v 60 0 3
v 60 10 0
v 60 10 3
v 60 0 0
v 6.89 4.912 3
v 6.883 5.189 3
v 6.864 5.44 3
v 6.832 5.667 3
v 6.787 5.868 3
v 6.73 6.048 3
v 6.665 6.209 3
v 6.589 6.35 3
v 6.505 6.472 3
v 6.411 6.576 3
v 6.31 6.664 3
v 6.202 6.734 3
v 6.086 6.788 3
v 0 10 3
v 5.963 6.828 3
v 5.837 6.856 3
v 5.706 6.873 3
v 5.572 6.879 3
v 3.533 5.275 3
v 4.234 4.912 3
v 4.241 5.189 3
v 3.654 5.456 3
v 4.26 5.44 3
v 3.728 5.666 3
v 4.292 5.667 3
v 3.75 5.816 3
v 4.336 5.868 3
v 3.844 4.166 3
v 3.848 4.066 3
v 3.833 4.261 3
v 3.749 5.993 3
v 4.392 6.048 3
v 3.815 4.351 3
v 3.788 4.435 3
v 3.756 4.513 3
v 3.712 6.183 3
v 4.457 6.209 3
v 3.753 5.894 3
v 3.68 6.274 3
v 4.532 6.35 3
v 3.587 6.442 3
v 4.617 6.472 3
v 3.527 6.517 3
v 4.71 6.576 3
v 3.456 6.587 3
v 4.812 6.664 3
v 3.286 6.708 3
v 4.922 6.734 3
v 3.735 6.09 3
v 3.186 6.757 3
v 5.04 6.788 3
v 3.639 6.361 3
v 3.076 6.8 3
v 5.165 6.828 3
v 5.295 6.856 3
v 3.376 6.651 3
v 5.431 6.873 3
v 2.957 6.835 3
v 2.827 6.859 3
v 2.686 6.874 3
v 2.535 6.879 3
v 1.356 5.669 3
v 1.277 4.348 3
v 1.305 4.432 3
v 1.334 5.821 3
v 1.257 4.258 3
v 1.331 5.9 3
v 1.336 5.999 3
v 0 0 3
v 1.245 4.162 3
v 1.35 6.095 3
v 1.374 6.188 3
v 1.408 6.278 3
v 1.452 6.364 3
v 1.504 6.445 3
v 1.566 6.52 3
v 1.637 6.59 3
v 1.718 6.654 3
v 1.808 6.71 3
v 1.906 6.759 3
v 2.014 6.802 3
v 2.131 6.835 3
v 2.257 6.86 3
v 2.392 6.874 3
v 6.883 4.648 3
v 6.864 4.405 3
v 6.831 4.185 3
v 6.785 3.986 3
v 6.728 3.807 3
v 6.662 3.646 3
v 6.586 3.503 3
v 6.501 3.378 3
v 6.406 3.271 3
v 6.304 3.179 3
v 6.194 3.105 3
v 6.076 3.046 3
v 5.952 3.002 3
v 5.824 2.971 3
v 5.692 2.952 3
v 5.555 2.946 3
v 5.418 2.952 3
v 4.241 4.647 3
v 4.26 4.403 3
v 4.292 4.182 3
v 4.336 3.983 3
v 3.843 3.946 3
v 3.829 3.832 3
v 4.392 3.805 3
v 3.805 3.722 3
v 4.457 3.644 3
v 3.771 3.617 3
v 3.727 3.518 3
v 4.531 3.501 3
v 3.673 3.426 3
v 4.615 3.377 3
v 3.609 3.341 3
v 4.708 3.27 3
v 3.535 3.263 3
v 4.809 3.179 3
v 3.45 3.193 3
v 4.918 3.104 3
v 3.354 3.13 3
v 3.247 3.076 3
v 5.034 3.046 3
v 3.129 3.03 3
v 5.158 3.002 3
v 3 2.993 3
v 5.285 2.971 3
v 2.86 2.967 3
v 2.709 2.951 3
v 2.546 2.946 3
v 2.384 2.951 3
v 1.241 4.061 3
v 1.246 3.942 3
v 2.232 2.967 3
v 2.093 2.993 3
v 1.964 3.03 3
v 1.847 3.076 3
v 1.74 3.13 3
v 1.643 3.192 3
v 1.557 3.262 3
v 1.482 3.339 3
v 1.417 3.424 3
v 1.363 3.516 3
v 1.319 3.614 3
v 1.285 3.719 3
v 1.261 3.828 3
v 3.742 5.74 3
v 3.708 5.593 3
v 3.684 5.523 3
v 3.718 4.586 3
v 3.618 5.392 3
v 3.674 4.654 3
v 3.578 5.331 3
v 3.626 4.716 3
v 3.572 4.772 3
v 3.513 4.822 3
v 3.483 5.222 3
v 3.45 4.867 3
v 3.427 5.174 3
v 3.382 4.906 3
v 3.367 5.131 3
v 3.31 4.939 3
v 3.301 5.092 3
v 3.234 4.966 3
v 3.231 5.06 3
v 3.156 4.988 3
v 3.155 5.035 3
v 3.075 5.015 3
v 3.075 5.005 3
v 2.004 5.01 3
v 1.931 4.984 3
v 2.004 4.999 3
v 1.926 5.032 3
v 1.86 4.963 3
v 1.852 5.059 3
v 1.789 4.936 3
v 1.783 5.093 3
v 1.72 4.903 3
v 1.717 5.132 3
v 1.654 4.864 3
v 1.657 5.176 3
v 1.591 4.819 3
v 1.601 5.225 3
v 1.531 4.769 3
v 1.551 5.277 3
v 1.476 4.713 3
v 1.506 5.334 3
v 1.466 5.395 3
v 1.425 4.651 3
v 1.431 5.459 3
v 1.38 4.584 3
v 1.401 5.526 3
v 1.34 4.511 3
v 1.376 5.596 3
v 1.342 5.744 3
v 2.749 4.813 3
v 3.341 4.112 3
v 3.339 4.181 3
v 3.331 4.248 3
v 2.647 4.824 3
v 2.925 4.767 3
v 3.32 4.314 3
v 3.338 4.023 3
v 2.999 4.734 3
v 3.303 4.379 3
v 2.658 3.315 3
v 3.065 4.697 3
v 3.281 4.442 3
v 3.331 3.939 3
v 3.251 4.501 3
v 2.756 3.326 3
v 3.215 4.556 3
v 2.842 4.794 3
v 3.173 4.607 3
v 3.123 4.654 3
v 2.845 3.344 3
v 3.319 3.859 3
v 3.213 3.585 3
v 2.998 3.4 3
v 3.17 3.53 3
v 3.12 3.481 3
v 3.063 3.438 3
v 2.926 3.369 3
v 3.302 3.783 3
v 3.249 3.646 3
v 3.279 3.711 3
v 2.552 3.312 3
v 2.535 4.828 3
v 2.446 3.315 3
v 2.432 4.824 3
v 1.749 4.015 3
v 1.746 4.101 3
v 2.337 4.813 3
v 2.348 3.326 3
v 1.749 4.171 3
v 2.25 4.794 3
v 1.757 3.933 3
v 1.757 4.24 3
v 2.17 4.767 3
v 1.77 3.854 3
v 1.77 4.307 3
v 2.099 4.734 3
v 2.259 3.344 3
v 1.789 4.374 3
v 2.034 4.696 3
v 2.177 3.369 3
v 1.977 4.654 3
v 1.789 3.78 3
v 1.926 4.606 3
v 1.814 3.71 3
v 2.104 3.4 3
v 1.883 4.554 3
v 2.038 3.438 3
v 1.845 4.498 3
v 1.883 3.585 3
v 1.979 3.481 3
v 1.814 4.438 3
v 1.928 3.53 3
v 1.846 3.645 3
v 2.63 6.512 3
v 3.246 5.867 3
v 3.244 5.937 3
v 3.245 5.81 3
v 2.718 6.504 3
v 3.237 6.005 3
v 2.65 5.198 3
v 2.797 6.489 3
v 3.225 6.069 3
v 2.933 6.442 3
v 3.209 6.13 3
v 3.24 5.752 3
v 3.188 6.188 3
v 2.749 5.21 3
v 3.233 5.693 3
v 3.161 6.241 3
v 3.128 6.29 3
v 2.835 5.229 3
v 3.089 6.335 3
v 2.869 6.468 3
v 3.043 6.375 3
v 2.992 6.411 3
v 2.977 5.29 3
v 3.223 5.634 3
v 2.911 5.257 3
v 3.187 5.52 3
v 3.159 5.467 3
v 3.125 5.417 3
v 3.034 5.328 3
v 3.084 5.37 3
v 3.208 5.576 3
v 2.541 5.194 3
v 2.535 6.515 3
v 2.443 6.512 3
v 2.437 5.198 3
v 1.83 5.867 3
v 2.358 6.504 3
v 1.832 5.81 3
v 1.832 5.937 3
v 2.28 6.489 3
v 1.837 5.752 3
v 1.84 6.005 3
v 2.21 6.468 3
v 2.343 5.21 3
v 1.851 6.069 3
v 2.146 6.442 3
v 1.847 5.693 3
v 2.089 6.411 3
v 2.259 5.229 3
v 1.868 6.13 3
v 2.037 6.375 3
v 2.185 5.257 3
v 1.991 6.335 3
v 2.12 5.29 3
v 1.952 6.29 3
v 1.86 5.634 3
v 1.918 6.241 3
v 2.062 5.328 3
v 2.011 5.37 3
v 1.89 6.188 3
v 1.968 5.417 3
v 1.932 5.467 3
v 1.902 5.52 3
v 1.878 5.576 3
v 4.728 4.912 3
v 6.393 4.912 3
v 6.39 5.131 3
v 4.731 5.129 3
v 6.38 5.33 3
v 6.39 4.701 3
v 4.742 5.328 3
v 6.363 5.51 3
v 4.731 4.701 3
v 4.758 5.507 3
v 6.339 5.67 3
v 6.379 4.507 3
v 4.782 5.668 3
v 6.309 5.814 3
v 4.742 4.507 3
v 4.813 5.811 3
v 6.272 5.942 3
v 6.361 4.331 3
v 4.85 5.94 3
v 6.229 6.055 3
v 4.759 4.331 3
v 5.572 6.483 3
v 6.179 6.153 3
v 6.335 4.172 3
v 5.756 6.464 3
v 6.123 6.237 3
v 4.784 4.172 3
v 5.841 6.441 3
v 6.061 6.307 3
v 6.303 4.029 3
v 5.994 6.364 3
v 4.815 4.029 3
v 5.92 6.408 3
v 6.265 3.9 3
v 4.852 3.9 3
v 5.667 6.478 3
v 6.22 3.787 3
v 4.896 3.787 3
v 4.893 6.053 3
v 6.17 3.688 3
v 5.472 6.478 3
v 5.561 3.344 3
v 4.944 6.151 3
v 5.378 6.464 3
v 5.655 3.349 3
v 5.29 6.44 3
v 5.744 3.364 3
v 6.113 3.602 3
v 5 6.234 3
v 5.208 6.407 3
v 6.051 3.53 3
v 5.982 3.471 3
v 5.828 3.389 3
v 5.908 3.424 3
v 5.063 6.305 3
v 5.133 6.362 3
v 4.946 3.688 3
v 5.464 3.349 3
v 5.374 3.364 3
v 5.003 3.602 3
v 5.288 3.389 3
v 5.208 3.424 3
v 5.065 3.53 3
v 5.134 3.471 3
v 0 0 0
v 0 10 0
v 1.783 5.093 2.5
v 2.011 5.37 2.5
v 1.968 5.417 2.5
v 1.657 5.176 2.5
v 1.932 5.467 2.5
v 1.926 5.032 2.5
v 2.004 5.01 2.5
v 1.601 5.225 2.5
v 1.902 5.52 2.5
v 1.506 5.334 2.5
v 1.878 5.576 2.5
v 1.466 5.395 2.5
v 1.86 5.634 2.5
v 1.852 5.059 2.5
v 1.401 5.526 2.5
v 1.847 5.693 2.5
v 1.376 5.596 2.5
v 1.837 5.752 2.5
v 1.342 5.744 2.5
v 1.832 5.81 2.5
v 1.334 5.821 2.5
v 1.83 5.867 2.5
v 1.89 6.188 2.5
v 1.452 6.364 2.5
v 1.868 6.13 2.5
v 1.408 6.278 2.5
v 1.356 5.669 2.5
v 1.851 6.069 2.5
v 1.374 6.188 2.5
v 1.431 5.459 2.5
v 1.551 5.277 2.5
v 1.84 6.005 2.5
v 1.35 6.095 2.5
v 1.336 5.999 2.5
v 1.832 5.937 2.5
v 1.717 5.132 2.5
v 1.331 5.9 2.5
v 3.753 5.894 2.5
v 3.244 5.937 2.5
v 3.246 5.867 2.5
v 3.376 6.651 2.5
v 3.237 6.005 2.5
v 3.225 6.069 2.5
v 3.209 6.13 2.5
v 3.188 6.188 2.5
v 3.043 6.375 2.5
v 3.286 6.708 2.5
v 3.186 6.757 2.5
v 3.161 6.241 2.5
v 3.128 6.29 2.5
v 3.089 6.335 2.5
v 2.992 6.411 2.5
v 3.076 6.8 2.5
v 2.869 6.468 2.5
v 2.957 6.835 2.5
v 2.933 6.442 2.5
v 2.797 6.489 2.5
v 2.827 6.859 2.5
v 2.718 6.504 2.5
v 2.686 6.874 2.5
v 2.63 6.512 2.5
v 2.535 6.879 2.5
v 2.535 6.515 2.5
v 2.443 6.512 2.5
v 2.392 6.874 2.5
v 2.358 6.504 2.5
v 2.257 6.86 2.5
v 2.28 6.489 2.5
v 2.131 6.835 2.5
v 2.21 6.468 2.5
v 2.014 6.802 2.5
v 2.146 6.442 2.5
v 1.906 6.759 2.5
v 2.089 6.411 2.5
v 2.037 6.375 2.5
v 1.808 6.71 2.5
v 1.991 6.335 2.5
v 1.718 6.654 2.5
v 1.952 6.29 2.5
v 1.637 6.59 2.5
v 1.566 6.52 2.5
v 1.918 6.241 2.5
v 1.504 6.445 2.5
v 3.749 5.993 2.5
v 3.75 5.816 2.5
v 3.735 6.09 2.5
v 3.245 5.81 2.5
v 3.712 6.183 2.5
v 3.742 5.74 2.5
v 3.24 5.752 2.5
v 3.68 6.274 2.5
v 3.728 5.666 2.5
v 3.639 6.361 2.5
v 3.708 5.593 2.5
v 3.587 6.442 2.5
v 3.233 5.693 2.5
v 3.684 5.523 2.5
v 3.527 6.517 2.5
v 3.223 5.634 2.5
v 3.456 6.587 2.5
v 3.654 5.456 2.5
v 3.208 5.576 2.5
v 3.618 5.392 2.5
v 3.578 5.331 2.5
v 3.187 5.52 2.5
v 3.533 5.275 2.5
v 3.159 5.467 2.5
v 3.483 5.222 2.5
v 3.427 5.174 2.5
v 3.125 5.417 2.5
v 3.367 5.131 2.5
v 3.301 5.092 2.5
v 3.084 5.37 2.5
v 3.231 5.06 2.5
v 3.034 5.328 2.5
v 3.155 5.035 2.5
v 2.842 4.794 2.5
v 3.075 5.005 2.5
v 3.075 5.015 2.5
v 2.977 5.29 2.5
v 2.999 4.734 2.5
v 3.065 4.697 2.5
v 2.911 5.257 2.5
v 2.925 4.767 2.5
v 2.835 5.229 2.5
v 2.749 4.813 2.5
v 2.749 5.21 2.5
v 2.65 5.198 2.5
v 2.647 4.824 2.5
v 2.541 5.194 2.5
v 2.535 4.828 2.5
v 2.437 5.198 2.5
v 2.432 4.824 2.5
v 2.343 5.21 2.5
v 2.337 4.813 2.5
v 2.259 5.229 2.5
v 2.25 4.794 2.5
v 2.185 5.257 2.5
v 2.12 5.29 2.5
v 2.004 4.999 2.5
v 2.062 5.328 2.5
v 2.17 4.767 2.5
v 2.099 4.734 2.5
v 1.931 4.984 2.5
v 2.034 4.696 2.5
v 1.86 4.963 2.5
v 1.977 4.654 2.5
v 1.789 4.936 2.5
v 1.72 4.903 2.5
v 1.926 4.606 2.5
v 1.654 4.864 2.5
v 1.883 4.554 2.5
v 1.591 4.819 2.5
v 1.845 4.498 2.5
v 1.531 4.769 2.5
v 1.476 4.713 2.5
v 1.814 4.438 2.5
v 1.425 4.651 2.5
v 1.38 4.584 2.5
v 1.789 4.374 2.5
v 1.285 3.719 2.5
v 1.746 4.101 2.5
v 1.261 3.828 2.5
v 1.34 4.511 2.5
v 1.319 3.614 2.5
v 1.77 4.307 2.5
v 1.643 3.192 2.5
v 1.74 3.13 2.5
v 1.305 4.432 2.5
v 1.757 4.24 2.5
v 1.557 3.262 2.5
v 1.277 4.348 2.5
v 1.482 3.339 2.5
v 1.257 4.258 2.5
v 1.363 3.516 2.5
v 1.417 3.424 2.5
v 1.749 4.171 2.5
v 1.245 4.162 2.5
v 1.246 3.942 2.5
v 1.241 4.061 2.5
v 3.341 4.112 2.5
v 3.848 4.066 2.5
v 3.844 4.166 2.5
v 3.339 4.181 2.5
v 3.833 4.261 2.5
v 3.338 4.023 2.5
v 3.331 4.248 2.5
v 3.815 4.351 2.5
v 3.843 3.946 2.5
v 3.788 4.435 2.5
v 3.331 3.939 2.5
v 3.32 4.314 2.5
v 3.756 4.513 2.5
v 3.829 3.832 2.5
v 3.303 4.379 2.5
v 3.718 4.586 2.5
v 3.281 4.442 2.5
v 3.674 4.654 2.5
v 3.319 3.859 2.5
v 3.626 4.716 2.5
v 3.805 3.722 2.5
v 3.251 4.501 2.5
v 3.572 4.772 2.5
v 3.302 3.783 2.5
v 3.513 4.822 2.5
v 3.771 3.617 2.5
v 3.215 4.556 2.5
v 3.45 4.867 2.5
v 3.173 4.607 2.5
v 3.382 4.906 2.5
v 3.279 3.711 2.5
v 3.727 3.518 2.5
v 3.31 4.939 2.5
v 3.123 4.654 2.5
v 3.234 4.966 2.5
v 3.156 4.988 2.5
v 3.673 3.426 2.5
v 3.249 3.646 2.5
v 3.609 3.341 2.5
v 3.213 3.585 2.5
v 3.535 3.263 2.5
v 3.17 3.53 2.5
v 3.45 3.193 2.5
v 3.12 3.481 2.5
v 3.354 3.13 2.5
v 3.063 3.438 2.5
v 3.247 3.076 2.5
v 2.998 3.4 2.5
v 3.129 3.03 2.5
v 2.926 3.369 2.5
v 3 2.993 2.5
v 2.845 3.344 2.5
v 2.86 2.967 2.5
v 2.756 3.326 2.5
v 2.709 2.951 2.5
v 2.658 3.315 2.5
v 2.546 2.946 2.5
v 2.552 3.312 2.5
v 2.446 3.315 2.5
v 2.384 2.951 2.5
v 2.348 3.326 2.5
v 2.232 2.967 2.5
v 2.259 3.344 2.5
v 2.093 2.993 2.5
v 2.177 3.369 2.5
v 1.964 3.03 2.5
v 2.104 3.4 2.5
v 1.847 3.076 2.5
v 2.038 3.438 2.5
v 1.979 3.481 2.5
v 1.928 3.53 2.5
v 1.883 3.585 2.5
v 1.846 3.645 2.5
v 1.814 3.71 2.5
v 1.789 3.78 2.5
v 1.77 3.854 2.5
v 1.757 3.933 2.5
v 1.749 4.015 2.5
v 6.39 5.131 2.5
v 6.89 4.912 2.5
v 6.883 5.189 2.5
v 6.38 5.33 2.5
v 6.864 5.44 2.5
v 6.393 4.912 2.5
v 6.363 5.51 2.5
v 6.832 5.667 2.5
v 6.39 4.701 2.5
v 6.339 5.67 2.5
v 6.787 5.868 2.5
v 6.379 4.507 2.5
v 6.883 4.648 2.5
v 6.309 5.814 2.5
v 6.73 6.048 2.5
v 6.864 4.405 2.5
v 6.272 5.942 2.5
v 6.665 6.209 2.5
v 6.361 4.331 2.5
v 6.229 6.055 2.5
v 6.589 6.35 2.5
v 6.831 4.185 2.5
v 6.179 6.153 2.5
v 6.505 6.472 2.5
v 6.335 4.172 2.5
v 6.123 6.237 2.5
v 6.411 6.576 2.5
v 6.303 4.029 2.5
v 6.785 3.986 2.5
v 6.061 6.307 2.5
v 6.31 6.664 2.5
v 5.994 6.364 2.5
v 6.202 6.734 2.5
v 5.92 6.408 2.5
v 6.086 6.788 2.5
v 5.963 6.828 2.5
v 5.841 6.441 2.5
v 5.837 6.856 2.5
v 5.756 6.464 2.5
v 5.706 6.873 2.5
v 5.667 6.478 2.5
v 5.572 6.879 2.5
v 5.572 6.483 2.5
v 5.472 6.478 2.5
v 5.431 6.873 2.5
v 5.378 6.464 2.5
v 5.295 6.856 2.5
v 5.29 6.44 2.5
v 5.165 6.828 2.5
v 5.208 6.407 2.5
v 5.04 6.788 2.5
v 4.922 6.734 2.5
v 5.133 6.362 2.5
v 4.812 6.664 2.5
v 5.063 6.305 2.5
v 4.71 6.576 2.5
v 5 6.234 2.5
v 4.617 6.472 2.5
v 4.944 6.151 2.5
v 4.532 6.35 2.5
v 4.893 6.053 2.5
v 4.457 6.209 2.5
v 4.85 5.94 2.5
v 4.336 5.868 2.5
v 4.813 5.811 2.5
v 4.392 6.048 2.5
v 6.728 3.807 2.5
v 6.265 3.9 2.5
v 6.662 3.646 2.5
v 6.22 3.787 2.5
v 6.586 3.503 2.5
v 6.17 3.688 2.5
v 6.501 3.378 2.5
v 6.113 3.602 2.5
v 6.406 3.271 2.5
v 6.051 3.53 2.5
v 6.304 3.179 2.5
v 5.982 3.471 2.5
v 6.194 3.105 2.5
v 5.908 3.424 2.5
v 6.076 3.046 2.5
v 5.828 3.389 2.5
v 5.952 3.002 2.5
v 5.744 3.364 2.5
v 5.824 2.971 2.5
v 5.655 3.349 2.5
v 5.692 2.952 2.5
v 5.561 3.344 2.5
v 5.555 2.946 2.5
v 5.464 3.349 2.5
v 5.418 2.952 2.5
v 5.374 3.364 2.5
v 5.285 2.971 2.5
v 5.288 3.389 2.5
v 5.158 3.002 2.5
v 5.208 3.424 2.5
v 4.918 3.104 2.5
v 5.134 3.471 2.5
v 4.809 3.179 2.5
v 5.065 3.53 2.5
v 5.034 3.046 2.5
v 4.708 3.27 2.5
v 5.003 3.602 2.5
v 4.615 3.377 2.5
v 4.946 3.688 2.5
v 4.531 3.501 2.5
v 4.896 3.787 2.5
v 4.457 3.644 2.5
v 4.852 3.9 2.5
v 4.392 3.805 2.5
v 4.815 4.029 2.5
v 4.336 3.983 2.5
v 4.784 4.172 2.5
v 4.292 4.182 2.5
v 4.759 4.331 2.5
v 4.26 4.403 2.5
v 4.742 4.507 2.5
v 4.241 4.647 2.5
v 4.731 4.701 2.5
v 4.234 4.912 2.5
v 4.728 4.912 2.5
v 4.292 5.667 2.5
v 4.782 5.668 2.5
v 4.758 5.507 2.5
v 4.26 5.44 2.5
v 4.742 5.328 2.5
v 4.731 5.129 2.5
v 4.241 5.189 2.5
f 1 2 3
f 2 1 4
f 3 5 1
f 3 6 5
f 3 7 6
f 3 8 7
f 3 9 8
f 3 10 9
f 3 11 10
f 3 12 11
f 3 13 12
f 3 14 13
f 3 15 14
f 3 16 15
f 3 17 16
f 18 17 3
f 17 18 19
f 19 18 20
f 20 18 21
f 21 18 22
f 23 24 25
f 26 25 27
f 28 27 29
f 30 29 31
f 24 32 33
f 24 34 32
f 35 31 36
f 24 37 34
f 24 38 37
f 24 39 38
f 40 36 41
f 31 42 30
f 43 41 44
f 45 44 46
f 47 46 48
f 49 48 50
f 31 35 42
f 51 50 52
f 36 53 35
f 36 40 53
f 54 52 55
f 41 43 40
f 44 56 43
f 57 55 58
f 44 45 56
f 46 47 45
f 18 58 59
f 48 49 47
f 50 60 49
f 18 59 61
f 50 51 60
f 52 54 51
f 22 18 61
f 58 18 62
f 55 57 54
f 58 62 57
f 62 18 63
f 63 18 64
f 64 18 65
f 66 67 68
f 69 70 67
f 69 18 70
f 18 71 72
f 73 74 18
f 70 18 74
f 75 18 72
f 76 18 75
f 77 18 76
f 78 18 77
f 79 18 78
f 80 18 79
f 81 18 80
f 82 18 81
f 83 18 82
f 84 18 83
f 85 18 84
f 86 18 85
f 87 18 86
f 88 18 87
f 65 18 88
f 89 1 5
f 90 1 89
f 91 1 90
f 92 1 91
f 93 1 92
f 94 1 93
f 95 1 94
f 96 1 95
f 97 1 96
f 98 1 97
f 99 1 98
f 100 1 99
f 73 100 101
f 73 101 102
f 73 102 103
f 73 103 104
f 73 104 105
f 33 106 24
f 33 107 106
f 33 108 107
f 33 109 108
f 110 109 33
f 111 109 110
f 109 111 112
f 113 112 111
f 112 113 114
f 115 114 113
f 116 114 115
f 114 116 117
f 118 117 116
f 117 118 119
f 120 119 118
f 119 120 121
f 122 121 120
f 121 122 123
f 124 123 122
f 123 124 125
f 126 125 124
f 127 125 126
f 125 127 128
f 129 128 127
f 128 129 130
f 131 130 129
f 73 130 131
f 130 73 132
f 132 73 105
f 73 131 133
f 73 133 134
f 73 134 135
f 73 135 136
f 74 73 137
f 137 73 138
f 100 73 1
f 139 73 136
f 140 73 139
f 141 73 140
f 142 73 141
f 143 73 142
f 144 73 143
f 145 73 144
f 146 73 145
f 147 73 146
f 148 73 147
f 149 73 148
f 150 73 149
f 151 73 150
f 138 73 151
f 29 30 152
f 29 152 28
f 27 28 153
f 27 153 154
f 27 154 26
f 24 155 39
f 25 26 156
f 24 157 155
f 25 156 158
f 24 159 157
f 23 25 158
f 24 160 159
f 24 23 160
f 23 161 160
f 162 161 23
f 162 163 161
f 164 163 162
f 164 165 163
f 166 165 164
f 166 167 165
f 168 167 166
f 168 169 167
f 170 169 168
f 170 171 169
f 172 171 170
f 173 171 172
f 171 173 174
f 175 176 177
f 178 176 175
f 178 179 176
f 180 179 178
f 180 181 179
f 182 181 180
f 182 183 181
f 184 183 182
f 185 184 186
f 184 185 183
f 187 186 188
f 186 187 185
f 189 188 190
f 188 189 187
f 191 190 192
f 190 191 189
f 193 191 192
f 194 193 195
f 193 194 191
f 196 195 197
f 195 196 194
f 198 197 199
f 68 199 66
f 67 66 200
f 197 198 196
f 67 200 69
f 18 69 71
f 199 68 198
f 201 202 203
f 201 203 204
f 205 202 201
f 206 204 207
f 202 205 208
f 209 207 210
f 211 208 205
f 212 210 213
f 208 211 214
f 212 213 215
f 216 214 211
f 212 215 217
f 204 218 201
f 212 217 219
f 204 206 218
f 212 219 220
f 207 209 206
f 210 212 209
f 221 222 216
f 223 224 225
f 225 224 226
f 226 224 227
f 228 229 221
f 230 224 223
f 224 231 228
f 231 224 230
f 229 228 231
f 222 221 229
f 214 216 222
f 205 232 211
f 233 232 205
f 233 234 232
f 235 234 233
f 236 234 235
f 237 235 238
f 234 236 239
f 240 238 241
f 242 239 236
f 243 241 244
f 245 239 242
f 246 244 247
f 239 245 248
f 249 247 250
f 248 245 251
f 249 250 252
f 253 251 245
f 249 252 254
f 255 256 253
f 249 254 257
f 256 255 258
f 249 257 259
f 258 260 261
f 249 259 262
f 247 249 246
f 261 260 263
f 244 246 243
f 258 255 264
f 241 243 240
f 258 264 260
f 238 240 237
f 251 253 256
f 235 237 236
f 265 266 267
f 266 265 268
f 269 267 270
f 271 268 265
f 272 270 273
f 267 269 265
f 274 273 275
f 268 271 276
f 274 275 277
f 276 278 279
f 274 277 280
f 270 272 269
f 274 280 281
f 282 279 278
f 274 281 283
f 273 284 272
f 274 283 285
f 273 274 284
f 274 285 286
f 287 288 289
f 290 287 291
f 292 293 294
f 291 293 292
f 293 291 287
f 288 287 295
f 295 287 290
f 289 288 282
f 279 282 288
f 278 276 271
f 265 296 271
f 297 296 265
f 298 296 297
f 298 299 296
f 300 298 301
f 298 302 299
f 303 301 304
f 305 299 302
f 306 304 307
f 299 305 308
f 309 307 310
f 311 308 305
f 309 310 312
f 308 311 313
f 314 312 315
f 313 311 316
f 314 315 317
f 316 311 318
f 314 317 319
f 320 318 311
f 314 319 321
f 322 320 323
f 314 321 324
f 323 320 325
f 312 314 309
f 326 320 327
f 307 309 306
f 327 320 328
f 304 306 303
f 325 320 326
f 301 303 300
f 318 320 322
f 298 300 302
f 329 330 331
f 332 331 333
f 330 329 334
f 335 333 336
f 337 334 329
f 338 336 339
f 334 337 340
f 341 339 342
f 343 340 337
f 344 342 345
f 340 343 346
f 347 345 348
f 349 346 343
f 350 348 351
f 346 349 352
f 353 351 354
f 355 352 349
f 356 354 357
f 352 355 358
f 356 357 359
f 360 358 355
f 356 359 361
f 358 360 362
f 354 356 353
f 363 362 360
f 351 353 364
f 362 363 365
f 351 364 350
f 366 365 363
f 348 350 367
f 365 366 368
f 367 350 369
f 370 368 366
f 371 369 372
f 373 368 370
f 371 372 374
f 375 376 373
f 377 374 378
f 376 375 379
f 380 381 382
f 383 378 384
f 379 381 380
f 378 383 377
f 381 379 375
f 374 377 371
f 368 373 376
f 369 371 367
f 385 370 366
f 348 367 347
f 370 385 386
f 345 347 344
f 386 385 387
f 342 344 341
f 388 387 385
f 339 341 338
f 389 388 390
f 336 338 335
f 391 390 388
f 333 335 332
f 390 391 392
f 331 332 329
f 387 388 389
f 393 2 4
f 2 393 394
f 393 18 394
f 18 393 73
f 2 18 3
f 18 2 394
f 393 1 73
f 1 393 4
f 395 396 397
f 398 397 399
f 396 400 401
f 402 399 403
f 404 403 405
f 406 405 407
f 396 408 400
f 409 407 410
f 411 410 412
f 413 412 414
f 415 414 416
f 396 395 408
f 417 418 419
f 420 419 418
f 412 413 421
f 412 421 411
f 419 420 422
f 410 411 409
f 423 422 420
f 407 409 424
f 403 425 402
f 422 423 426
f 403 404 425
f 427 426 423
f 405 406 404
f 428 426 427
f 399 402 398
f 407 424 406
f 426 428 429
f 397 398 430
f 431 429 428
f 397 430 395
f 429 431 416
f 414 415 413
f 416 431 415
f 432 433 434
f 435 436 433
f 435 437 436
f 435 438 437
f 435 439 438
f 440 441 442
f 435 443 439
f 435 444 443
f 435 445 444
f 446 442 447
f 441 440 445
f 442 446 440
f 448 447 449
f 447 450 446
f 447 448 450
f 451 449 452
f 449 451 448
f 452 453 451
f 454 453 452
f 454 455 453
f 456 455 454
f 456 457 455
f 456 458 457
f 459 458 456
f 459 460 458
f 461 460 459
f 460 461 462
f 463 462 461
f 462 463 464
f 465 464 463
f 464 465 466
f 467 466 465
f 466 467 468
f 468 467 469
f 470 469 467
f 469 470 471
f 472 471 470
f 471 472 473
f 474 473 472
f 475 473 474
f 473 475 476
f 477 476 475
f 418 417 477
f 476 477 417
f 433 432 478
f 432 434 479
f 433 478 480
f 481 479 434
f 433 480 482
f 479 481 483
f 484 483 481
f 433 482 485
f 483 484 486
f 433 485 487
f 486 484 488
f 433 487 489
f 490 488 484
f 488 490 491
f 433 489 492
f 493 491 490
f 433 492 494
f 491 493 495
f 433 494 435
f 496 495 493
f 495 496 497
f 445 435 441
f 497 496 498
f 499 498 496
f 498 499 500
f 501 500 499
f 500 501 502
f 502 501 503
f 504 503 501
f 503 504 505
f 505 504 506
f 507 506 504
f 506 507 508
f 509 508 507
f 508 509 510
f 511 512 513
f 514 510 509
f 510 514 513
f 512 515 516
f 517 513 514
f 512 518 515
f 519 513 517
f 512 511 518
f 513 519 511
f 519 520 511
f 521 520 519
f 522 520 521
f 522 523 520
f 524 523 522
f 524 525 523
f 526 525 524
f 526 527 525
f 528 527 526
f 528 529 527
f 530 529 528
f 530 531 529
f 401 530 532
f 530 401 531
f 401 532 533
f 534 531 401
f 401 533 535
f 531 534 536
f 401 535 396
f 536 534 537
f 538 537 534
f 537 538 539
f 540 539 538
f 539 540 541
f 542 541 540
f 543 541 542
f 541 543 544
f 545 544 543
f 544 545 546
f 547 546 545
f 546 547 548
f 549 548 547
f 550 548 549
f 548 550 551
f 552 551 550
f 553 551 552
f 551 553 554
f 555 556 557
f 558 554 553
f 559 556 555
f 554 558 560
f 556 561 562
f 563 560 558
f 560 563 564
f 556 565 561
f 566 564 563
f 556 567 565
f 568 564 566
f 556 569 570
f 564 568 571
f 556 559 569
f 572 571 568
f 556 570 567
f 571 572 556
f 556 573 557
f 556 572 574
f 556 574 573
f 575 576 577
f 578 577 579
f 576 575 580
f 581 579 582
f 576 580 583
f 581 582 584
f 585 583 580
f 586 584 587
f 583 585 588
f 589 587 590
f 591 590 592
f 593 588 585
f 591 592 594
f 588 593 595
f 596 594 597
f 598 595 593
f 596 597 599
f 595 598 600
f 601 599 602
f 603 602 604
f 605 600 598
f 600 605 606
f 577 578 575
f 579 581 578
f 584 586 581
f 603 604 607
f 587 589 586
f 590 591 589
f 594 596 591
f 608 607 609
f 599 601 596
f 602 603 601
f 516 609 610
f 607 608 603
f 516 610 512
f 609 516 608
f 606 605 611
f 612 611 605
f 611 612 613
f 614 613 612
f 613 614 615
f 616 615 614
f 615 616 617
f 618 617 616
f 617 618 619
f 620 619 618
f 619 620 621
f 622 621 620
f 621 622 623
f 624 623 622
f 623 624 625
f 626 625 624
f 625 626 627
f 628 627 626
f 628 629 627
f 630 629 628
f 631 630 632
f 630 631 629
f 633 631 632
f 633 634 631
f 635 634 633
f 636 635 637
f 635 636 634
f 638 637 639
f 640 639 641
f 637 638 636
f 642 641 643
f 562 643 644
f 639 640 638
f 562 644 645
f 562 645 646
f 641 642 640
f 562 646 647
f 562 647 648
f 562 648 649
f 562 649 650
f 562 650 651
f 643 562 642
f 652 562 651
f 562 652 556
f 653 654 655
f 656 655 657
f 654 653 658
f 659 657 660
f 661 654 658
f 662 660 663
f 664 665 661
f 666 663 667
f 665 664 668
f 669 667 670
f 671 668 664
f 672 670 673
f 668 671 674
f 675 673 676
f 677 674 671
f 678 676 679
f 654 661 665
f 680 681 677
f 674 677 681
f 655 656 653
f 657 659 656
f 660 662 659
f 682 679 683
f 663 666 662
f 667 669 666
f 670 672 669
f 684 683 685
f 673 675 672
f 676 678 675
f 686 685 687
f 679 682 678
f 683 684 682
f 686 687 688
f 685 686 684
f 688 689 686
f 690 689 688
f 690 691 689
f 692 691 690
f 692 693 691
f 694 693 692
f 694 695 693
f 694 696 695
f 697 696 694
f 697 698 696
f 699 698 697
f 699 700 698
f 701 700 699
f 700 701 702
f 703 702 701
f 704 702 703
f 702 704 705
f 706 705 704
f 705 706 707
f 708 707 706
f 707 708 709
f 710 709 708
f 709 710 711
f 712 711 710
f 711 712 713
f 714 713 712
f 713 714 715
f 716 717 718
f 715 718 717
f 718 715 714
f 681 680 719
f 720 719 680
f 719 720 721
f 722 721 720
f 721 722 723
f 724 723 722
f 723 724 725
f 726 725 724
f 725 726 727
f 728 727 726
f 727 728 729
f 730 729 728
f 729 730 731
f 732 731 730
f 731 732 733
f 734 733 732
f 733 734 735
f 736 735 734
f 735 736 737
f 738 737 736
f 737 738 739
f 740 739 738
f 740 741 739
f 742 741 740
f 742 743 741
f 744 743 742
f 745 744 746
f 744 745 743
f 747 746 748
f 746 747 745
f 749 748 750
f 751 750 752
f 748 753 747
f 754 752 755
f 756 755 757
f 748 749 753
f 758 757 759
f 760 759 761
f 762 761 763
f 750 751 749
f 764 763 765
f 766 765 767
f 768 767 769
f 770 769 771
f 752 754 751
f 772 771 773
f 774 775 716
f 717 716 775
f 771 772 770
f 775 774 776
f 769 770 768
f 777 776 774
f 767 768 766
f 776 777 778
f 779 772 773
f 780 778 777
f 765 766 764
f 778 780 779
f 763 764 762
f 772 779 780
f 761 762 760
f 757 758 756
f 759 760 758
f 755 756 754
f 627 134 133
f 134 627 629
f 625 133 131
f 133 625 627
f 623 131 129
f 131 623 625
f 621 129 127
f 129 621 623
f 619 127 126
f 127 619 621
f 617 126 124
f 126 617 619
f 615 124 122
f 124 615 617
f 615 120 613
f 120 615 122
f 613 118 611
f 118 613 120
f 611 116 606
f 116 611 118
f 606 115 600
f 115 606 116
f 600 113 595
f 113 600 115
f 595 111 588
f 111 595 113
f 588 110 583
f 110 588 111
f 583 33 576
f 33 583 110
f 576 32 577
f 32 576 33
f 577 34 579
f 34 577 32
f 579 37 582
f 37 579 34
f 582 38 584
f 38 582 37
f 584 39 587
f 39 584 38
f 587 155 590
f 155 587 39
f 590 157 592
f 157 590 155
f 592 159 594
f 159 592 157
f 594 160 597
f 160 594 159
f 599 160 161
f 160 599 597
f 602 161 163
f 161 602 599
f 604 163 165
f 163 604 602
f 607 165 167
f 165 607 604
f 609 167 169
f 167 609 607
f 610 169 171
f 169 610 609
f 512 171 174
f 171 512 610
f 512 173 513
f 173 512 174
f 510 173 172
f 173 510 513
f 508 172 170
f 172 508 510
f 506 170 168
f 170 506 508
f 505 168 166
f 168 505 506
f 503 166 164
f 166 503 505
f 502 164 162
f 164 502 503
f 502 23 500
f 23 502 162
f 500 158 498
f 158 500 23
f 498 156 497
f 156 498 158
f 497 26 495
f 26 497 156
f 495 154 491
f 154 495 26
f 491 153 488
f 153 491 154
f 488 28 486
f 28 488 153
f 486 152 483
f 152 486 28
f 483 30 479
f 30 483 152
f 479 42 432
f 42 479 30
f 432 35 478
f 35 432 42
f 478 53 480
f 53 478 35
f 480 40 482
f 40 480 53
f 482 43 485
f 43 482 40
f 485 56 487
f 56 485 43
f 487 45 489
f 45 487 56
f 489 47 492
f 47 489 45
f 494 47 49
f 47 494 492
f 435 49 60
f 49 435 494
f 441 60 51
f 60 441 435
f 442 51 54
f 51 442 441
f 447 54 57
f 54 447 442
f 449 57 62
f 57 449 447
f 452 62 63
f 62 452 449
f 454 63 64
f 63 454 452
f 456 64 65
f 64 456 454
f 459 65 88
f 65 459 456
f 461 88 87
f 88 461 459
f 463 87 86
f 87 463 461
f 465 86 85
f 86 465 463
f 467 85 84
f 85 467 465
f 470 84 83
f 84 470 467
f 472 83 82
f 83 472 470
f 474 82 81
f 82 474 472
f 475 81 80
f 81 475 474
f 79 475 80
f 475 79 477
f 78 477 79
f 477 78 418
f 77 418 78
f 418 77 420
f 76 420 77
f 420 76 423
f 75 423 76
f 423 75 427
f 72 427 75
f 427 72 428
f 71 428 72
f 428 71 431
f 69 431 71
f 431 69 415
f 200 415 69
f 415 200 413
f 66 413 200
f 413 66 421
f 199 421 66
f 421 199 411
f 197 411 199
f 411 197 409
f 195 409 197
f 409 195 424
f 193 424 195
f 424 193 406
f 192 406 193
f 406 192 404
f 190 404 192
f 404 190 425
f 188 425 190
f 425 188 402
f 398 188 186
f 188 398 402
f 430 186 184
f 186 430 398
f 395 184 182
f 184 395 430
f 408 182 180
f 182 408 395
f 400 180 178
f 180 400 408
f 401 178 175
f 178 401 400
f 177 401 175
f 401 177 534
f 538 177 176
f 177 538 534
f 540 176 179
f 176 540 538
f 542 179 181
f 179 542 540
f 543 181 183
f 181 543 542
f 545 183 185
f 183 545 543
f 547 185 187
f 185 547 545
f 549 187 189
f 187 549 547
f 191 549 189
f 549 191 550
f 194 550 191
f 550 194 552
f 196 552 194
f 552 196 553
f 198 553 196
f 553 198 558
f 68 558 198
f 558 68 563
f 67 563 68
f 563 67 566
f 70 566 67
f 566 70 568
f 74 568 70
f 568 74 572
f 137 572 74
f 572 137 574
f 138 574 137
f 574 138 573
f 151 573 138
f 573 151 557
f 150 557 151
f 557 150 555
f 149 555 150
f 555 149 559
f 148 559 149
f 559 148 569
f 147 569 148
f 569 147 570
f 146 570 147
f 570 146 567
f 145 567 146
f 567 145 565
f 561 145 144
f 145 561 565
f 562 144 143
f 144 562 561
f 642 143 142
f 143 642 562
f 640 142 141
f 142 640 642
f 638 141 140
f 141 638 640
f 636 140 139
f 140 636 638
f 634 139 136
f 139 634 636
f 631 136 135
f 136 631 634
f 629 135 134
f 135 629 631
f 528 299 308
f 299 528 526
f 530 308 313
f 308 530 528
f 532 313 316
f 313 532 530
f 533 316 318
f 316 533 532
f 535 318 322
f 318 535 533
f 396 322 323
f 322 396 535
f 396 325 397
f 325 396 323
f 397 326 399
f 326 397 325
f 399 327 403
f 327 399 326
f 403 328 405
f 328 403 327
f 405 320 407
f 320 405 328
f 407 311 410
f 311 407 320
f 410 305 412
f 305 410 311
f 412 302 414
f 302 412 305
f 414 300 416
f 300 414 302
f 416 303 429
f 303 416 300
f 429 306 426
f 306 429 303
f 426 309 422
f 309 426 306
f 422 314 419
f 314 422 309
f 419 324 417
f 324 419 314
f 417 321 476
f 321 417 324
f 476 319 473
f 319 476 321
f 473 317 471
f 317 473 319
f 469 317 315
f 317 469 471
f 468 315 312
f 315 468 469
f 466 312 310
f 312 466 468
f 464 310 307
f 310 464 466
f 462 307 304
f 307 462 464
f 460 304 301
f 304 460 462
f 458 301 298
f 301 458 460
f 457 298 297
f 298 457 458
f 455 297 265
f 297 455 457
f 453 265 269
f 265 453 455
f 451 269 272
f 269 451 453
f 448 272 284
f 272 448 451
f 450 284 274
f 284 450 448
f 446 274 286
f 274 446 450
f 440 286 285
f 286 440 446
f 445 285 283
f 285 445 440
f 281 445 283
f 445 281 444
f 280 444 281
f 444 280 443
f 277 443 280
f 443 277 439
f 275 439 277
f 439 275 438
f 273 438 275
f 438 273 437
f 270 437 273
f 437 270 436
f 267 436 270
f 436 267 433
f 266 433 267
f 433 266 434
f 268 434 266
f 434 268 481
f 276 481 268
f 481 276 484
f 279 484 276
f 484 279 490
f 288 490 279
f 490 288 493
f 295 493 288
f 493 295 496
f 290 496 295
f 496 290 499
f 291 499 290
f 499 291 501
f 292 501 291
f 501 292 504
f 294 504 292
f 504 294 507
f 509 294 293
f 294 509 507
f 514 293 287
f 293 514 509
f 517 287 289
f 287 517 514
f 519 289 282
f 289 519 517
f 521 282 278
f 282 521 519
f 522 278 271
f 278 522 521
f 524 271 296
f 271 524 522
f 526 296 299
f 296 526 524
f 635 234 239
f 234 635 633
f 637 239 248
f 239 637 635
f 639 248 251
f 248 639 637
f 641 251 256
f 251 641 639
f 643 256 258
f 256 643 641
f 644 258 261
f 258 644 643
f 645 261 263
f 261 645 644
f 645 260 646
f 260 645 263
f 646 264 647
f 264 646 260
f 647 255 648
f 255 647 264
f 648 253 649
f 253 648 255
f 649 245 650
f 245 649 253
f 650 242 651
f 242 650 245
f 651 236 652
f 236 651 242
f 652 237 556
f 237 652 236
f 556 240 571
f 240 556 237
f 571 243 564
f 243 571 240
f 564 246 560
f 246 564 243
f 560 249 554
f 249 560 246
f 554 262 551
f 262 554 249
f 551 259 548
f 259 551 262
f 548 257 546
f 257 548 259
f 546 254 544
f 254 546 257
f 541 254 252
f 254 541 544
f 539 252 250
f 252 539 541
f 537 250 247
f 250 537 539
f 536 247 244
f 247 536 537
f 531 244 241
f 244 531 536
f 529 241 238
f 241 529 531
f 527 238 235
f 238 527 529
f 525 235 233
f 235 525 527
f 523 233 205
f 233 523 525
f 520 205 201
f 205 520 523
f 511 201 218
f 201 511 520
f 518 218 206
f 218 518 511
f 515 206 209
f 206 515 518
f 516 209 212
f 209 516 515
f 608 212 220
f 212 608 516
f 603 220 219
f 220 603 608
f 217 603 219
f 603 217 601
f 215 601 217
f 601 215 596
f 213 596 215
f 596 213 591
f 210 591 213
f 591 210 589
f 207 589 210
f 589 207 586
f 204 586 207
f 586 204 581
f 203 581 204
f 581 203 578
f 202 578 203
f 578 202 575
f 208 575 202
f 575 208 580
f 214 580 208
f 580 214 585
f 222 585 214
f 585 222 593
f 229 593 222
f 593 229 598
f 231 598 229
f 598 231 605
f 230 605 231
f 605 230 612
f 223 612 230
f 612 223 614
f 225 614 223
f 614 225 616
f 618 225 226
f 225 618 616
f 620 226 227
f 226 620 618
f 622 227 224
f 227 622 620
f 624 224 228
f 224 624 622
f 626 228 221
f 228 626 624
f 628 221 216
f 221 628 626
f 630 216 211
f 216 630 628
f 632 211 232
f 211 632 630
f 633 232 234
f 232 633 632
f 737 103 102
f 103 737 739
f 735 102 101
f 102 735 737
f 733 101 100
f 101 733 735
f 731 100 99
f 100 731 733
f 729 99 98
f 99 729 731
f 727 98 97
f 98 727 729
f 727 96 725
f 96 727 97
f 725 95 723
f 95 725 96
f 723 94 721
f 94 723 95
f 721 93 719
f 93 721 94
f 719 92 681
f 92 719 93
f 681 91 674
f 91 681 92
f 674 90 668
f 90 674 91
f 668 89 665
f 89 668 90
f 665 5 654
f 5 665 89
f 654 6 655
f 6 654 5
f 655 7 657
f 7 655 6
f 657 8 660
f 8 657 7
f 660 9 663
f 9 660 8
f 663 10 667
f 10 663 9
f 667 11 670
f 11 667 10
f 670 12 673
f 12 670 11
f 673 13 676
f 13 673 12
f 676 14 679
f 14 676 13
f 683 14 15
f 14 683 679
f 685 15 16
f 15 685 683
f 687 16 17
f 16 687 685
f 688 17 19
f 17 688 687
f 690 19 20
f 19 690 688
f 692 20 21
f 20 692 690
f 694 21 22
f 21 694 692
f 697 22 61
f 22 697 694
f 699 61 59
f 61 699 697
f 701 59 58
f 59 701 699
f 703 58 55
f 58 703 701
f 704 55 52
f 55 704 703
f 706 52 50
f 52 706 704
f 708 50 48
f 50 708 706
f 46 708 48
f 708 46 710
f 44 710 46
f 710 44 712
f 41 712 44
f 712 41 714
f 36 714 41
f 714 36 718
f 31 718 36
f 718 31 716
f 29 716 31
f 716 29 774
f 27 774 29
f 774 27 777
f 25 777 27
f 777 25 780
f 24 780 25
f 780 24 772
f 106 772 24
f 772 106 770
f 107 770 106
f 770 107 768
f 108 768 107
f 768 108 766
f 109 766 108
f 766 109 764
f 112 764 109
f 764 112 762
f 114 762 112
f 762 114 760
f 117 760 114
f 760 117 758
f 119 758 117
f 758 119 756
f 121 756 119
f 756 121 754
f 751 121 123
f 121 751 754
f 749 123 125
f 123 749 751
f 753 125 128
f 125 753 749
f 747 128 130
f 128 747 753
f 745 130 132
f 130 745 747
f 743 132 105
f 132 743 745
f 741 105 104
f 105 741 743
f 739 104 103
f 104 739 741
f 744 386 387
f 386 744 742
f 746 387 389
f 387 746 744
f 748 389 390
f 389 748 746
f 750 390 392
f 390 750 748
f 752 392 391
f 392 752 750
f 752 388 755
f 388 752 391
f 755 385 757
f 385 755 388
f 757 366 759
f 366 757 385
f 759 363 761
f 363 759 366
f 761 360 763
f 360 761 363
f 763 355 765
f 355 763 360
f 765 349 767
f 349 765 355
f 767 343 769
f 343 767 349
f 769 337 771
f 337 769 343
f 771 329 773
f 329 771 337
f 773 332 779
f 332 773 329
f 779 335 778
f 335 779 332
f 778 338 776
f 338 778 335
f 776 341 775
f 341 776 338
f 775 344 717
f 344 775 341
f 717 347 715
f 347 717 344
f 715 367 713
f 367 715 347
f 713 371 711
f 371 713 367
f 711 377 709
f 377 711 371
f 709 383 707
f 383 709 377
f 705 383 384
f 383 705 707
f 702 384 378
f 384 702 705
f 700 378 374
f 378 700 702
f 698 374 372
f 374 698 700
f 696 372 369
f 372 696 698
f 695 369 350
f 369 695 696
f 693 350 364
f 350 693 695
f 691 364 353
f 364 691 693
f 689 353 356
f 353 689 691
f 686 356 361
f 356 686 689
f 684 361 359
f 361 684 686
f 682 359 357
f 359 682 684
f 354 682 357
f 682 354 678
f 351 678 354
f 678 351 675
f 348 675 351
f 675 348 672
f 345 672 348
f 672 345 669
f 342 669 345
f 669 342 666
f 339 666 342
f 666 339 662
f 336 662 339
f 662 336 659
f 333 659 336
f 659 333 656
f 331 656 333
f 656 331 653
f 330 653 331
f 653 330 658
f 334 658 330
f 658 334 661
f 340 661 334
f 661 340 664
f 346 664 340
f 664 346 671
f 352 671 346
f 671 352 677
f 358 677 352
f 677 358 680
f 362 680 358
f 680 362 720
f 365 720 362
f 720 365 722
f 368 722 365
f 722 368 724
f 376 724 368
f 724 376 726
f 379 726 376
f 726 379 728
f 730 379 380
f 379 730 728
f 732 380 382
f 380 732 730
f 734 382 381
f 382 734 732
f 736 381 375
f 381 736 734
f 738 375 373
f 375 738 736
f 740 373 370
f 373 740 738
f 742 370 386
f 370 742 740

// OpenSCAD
$fn = 25;

difference() {
  cube([60, 10, 3]);
  translate([1, 3, 2.5])
  linear_extrude(height = 1) {
    text("80", size=4);
  }
}
